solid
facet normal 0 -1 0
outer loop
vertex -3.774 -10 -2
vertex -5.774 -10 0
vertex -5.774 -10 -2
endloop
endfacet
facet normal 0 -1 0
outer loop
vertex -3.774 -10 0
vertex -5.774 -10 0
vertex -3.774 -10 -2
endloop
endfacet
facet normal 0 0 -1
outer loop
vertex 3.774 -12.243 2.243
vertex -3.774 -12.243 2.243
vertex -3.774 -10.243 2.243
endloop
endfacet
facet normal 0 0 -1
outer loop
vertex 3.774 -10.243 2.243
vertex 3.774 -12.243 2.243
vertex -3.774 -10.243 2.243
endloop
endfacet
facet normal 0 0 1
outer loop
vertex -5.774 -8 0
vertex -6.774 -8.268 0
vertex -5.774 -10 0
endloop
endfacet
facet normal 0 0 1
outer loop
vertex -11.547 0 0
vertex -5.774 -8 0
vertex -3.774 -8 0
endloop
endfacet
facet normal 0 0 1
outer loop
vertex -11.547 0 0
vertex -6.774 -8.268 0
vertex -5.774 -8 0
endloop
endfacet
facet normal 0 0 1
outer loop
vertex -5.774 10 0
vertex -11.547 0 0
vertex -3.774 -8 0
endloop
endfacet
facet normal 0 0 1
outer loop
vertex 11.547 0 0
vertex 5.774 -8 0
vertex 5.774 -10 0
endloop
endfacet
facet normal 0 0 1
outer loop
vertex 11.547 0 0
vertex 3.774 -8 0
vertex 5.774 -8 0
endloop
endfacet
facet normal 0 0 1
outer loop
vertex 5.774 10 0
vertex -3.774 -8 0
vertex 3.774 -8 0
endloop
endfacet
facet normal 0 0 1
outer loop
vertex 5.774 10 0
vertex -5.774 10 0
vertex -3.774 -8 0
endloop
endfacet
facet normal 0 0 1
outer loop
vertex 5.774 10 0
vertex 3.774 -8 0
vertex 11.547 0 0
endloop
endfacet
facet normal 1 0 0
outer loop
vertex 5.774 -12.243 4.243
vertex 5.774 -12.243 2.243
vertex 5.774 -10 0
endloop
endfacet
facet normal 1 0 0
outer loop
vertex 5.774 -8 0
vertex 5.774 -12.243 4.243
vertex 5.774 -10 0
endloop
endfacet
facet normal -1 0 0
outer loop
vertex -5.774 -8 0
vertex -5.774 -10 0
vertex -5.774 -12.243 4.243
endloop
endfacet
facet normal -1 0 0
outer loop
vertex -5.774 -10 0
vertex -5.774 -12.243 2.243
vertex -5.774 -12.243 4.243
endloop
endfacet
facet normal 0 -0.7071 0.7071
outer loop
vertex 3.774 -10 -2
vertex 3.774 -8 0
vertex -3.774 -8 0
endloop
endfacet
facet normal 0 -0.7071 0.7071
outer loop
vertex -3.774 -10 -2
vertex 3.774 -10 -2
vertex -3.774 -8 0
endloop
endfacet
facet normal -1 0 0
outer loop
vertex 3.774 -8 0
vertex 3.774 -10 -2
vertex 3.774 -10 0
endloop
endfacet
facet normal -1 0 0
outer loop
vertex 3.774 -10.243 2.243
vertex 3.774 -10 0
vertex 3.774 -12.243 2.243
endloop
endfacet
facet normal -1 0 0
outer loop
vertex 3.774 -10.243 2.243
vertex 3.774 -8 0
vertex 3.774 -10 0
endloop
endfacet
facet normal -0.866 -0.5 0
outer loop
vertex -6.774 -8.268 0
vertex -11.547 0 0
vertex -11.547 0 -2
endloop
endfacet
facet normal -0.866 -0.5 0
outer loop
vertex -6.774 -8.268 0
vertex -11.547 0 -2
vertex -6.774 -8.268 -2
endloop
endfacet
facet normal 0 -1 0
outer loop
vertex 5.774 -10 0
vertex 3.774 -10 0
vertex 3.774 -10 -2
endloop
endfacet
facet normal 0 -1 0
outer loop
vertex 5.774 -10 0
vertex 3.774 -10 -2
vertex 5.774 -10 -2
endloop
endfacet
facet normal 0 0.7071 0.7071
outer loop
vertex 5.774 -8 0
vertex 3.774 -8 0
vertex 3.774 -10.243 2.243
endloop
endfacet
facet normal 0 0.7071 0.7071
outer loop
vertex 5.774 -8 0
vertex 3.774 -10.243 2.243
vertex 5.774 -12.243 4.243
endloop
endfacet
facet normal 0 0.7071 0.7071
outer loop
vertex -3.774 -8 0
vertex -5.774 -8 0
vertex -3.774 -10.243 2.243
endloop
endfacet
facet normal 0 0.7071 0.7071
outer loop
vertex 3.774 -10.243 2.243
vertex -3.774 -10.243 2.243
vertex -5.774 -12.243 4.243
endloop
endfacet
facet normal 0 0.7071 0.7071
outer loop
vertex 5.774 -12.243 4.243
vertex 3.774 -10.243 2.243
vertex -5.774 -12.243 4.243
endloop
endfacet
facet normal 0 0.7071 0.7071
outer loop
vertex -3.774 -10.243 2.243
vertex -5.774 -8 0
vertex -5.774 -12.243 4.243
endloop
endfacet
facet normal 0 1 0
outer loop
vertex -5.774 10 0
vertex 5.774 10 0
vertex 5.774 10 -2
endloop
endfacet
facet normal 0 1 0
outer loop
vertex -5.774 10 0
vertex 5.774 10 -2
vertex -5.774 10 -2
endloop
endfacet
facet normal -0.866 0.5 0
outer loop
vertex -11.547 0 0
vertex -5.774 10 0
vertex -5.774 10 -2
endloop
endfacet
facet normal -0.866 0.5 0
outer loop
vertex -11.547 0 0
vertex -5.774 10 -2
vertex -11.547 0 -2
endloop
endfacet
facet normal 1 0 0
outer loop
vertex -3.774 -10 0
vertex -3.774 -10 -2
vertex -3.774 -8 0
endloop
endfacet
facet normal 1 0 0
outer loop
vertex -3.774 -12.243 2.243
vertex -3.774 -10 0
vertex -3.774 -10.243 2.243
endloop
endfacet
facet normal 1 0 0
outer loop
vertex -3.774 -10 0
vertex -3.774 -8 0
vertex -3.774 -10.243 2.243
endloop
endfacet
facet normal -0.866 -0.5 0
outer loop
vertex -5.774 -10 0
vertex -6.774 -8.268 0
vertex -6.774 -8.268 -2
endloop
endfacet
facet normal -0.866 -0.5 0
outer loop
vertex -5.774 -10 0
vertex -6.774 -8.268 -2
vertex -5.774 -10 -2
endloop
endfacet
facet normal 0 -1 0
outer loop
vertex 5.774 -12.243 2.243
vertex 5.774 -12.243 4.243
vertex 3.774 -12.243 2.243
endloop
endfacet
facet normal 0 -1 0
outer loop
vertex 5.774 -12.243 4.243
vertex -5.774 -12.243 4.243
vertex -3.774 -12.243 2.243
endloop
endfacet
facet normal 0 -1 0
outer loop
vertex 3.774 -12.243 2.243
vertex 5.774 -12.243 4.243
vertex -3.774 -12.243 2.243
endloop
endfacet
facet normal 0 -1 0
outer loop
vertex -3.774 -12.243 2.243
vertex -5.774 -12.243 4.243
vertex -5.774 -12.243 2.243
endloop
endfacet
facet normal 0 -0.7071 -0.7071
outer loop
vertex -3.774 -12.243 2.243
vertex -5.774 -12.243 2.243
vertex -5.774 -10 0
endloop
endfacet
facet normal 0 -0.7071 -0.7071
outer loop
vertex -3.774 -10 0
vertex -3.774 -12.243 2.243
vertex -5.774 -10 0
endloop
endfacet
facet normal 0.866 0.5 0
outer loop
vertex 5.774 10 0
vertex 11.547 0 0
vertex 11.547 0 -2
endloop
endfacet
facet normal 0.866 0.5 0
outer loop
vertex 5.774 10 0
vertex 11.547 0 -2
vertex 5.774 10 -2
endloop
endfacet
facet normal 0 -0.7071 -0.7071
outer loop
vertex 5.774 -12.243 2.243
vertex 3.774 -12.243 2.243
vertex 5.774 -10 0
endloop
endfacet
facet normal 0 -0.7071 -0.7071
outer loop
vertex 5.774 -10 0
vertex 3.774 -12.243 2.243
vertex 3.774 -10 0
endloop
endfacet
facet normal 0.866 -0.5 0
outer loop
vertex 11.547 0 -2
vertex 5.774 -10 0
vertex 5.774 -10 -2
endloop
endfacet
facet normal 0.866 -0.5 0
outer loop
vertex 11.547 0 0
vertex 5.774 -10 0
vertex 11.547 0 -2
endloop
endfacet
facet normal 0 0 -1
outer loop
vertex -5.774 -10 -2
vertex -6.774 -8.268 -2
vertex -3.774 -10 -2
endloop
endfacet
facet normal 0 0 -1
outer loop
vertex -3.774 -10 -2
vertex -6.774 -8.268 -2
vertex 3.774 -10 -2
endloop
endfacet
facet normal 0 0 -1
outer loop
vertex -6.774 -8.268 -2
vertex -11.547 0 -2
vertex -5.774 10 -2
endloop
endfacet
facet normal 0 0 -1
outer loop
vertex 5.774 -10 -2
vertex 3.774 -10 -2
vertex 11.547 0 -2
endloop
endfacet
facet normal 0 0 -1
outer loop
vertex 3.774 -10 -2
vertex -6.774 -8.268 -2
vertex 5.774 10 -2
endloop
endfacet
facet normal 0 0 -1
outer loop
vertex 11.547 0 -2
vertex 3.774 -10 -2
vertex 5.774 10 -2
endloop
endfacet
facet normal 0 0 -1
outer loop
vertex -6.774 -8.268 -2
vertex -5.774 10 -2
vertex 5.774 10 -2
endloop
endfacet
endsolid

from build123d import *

# Parameters (mm, degrees)
F1_DEPTH = 2
F4_DEPTH = 11.54701
F5_W     = 7.54701
F5_H     = 6
F6_DEPTH = 25
F8_DEPTH = 7.54701


# Not quite as in the source:
# - the program builds the solid bodies; features that only make, move or delete a surface that nothing else refers to are left out


with BuildPart() as f1:
    # F0 (on Top) → F1 (new body)
    with BuildSketch(Plane.XY):
        Polygon((-3.7735026919, -10), (5.7735026919, -10), (11.5470053838, 0), (5.7735026919, 10), (0, 10), (-5.7735026919, 10), (-11.5470053838, 0), (-6.7735026919, -8.2679491924), (-5.7735026919, -10), align=None)
    extrude(amount=-F1_DEPTH)

    # F3 (on face) → F4 (join)
    with BuildSketch(Plane.YZ.offset(-5.7735026919)):
        Polygon((-10, 2), (-10, 0), (-8, 0), align=None)
        Polygon((-12.2426406871, 2.2426406871), (-10, 0), (-10, 2), (-12.2426406871, 4.2426406871), align=None)
    extrude(amount=F4_DEPTH)

    # F5 (on face) → F6 (cut)
    with BuildSketch(Plane(origin=(0, -4, -4), x_dir=(-1, 0, 0), z_dir=(0, 0.7071067812, 0.7071067812))):
        with Locations((-2.3081e-06, 8.6568542495)):
            Rectangle(F5_W, F5_H)
    extrude(amount=-F6_DEPTH, mode=Mode.SUBTRACT)

    # F7 (on face) → F8 (join, through all)
    with BuildSketch(Plane.YZ.offset(-3.7735026919)):
        Polygon((-12.2426406871, 4.2426406871), (-12.2426406871, 2.2426406871), (-10.2426406871, 2.2426406871), align=None)
    extrude(amount=F8_DEPTH)


solid = f1.part
